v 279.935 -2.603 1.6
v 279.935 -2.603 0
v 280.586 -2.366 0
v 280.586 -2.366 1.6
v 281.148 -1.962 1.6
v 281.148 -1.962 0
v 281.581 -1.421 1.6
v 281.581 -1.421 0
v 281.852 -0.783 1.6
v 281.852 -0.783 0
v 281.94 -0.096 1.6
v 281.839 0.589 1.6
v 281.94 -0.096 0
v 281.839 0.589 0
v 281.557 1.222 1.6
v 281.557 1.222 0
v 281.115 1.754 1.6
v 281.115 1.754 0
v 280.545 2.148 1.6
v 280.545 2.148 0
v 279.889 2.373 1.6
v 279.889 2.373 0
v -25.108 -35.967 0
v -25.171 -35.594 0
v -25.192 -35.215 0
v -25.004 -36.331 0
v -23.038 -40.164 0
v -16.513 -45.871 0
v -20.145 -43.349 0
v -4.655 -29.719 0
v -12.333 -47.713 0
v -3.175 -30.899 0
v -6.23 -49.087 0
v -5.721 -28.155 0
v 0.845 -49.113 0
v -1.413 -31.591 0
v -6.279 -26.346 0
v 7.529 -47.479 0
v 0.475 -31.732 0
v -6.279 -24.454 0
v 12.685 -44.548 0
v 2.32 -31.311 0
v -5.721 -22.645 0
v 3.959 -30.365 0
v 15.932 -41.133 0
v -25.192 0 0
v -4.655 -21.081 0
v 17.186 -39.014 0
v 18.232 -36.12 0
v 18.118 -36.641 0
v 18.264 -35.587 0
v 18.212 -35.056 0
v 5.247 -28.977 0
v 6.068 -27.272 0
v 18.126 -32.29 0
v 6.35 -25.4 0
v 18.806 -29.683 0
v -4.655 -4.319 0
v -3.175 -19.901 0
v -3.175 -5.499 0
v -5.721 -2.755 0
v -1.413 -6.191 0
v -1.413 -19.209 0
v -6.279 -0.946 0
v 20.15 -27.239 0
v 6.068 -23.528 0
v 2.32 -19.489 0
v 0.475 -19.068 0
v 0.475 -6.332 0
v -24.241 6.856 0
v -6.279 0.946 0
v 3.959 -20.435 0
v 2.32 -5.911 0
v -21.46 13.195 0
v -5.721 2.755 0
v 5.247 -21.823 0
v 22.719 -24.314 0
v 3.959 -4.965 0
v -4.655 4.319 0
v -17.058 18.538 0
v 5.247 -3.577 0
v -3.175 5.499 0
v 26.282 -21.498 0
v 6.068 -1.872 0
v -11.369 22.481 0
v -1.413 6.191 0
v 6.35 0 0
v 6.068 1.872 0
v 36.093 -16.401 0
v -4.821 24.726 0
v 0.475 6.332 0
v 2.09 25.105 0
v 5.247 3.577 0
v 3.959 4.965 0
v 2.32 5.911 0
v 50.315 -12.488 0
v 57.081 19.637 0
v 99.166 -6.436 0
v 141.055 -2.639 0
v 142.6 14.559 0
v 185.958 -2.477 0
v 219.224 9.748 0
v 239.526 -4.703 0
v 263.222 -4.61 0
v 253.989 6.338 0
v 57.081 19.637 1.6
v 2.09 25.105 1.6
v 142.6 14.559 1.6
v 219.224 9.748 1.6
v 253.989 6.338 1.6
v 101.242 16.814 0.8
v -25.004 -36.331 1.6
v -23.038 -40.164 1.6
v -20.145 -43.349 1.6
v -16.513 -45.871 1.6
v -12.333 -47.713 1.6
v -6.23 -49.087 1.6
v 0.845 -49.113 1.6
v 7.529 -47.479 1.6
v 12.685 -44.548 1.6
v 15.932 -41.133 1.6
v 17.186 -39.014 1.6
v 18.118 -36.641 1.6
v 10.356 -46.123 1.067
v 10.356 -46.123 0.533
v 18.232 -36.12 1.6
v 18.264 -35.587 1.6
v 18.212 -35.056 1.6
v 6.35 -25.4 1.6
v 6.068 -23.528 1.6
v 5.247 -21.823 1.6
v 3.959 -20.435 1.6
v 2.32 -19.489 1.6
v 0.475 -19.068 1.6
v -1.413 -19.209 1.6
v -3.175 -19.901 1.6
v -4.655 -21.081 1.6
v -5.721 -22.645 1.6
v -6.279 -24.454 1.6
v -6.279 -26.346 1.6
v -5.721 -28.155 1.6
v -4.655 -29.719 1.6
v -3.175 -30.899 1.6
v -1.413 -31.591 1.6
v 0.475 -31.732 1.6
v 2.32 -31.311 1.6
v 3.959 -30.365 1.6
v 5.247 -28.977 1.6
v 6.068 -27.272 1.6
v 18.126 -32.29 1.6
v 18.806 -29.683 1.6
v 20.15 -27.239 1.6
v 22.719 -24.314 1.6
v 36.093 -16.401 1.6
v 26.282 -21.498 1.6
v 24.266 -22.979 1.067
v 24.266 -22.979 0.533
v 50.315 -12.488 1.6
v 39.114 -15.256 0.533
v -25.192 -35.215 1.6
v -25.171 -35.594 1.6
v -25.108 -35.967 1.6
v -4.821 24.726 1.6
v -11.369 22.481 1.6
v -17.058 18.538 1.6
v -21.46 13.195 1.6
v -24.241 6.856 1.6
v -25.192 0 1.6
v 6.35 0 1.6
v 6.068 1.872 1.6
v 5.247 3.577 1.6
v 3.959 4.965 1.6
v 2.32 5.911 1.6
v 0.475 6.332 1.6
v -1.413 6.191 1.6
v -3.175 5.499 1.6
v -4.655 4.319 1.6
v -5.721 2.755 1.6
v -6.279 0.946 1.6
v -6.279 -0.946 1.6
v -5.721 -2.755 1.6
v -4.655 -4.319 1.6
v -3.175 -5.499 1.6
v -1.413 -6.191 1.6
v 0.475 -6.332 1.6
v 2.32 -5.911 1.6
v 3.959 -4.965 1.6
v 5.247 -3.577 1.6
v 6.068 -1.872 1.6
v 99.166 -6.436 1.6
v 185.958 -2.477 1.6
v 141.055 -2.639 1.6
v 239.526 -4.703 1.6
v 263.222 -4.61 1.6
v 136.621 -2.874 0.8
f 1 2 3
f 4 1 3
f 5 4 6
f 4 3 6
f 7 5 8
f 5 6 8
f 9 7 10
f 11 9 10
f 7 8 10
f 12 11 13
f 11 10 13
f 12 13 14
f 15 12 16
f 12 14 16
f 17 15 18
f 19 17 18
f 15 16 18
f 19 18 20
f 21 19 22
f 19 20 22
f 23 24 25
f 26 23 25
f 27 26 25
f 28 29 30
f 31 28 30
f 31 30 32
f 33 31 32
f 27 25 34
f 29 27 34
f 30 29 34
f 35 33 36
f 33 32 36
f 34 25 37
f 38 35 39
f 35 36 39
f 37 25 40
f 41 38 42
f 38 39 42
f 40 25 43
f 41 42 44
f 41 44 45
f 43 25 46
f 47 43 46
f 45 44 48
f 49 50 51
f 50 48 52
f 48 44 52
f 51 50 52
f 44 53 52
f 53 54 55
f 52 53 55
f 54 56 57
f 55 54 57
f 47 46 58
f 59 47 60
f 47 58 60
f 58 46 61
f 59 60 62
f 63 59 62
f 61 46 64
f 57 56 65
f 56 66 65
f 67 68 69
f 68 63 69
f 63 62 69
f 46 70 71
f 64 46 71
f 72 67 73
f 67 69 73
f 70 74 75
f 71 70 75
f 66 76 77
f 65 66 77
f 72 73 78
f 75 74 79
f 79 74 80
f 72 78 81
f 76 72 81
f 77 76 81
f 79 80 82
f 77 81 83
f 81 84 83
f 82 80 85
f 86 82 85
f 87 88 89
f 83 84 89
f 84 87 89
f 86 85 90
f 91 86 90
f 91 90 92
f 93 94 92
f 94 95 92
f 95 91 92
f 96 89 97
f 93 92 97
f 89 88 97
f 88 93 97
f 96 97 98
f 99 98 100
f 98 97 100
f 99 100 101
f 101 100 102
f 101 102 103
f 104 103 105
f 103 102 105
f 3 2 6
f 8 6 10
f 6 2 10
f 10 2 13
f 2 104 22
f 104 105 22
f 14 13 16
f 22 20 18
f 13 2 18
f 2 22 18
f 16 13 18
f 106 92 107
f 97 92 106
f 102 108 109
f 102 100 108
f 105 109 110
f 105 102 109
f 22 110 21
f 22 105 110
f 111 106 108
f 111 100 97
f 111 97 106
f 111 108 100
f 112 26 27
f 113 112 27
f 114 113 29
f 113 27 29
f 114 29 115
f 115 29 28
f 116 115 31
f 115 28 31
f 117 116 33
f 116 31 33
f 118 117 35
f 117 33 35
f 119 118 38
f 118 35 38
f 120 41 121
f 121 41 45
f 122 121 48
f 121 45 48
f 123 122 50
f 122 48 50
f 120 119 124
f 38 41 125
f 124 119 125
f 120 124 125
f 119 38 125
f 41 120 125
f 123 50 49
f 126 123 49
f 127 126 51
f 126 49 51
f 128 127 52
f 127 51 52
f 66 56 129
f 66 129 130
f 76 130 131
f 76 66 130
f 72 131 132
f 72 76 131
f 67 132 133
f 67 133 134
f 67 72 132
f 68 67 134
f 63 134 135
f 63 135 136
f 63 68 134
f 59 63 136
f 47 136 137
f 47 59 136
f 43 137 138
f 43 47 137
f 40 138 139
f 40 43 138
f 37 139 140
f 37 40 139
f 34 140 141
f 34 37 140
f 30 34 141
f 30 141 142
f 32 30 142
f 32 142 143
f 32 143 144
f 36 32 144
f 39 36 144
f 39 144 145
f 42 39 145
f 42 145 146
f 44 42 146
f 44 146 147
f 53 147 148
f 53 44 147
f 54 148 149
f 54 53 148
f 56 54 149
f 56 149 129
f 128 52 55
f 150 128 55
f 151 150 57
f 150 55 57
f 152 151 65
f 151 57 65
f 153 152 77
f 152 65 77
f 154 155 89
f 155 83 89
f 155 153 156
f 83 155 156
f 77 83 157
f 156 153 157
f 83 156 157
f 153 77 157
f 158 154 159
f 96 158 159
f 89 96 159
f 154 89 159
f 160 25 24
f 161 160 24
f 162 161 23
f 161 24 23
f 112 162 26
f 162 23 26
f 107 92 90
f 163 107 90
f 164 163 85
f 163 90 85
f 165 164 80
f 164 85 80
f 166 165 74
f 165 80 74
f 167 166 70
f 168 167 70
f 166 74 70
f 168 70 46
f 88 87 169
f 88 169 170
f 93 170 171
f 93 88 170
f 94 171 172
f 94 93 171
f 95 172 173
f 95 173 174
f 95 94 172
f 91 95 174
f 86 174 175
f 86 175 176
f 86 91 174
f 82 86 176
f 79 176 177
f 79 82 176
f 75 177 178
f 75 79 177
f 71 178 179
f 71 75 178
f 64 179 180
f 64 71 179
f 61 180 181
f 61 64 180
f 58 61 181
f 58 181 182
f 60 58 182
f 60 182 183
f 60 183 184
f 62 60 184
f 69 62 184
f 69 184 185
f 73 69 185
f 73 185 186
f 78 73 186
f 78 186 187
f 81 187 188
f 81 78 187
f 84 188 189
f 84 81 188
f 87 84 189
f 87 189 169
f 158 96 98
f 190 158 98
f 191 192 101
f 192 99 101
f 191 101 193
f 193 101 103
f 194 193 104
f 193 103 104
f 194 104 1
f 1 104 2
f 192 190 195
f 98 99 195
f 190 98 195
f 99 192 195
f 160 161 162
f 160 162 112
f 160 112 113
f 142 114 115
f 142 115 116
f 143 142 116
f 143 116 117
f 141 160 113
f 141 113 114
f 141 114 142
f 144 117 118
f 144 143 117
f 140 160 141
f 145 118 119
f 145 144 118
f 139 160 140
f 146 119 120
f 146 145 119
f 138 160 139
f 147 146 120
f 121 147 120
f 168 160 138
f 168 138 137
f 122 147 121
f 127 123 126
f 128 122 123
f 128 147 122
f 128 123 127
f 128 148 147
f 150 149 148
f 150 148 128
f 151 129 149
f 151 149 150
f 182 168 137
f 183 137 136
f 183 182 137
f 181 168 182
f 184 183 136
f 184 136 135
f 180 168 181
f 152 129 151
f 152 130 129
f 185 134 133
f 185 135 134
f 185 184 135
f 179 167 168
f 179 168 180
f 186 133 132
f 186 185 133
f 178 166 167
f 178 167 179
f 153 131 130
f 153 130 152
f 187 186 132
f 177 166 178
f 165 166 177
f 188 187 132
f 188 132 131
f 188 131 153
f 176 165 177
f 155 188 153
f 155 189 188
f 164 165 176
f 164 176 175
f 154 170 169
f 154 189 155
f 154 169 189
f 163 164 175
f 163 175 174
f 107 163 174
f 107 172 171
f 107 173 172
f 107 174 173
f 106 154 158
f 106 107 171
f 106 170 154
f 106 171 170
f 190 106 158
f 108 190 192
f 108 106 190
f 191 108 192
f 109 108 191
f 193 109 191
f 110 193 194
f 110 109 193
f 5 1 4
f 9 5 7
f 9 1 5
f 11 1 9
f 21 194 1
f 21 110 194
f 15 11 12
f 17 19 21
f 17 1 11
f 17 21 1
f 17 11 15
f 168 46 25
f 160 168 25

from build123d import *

# Parameters (mm, degrees)
SKETCH1_R           = 6.35
BOSS_EXTRUDE1_DEPTH = 1.6002


with BuildPart() as part:
    # Sketch1 → Boss-Extrude1 (new body)
    with BuildSketch(Plane.XY):
        with BuildLine():
            Line((-25.191875828, 0), (-25.191875828, -35.215356132))
            ThreePointArc((-25.191875828, -35.215356132), (-25.144594979, -35.781140778), (-25.004063999, -36.331230578))
            add(Edge.make_bspline(
                [(-25.004063999, -36.331230578), (-24.302161584, -38.357321078), (-17.500345693, -49.472928078), (6.486565439, -52.353017034), (16.828257208, -40.890808587), (18.117618202, -36.640731795)],
                knots=[0.011286064, 0.011286064, 0.011286064, 0.011286064, 0.130987572, 0.750185474, 0.983991621, 0.983991621, 0.983991621, 0.983991621], degree=3))
            ThreePointArc((18.117618202, -36.640731795), (18.258374718, -35.854153527), (18.212152653, -35.056418427))
            add(Edge.make_bspline(
                [(18.212152653, -35.056418427), (15.722327617, -21.003254002), (45.083704914, -12.577387864), (50.314621311, -12.487786805)],
                knots=[0.243688719, 0.243688719, 0.243688719, 0.243688719, 1, 1, 1, 1], degree=3))
            add(Edge.make_bspline(
                [(50.314621311, -12.487786805), (67.828969762, -11.217353563), (162.851239243, 6.097445829), (250.038282618, -9.041784468), (279.934807735, -2.602592093)],
                knots=[0.23584572, 0.23584572, 0.23584572, 0.23584572, 0.495200792, 0.941477437, 0.941477437, 0.941477437, 0.941477437], degree=3))
            ThreePointArc((279.934807735, -2.602592093), (281.939894054, -0.09633433), (279.889362488, 2.372880002))
            add(Edge.make_bspline(
                [(2.090204907, 25.105012471), (29.372633882, 21.318909318), (128.041674084, 14.540572725), (239.548411309, 10.293455518), (279.889362488, 2.372880002)],
                knots=[0.008543469, 0.008543469, 0.008543469, 0.008543469, 0.340594684, 0.94139515, 0.94139515, 0.94139515, 0.94139515], degree=3))
            ThreePointArc((2.090204907, 25.105012471), (-17.058347301, 18.537621075), (-25.191875828, 0))
        make_face()
        with Locations((0, -25.4)):
            Circle(SKETCH1_R, mode=Mode.SUBTRACT)
        Circle(SKETCH1_R, mode=Mode.SUBTRACT)
    extrude(amount=BOSS_EXTRUDE1_DEPTH)


solid = part.part
